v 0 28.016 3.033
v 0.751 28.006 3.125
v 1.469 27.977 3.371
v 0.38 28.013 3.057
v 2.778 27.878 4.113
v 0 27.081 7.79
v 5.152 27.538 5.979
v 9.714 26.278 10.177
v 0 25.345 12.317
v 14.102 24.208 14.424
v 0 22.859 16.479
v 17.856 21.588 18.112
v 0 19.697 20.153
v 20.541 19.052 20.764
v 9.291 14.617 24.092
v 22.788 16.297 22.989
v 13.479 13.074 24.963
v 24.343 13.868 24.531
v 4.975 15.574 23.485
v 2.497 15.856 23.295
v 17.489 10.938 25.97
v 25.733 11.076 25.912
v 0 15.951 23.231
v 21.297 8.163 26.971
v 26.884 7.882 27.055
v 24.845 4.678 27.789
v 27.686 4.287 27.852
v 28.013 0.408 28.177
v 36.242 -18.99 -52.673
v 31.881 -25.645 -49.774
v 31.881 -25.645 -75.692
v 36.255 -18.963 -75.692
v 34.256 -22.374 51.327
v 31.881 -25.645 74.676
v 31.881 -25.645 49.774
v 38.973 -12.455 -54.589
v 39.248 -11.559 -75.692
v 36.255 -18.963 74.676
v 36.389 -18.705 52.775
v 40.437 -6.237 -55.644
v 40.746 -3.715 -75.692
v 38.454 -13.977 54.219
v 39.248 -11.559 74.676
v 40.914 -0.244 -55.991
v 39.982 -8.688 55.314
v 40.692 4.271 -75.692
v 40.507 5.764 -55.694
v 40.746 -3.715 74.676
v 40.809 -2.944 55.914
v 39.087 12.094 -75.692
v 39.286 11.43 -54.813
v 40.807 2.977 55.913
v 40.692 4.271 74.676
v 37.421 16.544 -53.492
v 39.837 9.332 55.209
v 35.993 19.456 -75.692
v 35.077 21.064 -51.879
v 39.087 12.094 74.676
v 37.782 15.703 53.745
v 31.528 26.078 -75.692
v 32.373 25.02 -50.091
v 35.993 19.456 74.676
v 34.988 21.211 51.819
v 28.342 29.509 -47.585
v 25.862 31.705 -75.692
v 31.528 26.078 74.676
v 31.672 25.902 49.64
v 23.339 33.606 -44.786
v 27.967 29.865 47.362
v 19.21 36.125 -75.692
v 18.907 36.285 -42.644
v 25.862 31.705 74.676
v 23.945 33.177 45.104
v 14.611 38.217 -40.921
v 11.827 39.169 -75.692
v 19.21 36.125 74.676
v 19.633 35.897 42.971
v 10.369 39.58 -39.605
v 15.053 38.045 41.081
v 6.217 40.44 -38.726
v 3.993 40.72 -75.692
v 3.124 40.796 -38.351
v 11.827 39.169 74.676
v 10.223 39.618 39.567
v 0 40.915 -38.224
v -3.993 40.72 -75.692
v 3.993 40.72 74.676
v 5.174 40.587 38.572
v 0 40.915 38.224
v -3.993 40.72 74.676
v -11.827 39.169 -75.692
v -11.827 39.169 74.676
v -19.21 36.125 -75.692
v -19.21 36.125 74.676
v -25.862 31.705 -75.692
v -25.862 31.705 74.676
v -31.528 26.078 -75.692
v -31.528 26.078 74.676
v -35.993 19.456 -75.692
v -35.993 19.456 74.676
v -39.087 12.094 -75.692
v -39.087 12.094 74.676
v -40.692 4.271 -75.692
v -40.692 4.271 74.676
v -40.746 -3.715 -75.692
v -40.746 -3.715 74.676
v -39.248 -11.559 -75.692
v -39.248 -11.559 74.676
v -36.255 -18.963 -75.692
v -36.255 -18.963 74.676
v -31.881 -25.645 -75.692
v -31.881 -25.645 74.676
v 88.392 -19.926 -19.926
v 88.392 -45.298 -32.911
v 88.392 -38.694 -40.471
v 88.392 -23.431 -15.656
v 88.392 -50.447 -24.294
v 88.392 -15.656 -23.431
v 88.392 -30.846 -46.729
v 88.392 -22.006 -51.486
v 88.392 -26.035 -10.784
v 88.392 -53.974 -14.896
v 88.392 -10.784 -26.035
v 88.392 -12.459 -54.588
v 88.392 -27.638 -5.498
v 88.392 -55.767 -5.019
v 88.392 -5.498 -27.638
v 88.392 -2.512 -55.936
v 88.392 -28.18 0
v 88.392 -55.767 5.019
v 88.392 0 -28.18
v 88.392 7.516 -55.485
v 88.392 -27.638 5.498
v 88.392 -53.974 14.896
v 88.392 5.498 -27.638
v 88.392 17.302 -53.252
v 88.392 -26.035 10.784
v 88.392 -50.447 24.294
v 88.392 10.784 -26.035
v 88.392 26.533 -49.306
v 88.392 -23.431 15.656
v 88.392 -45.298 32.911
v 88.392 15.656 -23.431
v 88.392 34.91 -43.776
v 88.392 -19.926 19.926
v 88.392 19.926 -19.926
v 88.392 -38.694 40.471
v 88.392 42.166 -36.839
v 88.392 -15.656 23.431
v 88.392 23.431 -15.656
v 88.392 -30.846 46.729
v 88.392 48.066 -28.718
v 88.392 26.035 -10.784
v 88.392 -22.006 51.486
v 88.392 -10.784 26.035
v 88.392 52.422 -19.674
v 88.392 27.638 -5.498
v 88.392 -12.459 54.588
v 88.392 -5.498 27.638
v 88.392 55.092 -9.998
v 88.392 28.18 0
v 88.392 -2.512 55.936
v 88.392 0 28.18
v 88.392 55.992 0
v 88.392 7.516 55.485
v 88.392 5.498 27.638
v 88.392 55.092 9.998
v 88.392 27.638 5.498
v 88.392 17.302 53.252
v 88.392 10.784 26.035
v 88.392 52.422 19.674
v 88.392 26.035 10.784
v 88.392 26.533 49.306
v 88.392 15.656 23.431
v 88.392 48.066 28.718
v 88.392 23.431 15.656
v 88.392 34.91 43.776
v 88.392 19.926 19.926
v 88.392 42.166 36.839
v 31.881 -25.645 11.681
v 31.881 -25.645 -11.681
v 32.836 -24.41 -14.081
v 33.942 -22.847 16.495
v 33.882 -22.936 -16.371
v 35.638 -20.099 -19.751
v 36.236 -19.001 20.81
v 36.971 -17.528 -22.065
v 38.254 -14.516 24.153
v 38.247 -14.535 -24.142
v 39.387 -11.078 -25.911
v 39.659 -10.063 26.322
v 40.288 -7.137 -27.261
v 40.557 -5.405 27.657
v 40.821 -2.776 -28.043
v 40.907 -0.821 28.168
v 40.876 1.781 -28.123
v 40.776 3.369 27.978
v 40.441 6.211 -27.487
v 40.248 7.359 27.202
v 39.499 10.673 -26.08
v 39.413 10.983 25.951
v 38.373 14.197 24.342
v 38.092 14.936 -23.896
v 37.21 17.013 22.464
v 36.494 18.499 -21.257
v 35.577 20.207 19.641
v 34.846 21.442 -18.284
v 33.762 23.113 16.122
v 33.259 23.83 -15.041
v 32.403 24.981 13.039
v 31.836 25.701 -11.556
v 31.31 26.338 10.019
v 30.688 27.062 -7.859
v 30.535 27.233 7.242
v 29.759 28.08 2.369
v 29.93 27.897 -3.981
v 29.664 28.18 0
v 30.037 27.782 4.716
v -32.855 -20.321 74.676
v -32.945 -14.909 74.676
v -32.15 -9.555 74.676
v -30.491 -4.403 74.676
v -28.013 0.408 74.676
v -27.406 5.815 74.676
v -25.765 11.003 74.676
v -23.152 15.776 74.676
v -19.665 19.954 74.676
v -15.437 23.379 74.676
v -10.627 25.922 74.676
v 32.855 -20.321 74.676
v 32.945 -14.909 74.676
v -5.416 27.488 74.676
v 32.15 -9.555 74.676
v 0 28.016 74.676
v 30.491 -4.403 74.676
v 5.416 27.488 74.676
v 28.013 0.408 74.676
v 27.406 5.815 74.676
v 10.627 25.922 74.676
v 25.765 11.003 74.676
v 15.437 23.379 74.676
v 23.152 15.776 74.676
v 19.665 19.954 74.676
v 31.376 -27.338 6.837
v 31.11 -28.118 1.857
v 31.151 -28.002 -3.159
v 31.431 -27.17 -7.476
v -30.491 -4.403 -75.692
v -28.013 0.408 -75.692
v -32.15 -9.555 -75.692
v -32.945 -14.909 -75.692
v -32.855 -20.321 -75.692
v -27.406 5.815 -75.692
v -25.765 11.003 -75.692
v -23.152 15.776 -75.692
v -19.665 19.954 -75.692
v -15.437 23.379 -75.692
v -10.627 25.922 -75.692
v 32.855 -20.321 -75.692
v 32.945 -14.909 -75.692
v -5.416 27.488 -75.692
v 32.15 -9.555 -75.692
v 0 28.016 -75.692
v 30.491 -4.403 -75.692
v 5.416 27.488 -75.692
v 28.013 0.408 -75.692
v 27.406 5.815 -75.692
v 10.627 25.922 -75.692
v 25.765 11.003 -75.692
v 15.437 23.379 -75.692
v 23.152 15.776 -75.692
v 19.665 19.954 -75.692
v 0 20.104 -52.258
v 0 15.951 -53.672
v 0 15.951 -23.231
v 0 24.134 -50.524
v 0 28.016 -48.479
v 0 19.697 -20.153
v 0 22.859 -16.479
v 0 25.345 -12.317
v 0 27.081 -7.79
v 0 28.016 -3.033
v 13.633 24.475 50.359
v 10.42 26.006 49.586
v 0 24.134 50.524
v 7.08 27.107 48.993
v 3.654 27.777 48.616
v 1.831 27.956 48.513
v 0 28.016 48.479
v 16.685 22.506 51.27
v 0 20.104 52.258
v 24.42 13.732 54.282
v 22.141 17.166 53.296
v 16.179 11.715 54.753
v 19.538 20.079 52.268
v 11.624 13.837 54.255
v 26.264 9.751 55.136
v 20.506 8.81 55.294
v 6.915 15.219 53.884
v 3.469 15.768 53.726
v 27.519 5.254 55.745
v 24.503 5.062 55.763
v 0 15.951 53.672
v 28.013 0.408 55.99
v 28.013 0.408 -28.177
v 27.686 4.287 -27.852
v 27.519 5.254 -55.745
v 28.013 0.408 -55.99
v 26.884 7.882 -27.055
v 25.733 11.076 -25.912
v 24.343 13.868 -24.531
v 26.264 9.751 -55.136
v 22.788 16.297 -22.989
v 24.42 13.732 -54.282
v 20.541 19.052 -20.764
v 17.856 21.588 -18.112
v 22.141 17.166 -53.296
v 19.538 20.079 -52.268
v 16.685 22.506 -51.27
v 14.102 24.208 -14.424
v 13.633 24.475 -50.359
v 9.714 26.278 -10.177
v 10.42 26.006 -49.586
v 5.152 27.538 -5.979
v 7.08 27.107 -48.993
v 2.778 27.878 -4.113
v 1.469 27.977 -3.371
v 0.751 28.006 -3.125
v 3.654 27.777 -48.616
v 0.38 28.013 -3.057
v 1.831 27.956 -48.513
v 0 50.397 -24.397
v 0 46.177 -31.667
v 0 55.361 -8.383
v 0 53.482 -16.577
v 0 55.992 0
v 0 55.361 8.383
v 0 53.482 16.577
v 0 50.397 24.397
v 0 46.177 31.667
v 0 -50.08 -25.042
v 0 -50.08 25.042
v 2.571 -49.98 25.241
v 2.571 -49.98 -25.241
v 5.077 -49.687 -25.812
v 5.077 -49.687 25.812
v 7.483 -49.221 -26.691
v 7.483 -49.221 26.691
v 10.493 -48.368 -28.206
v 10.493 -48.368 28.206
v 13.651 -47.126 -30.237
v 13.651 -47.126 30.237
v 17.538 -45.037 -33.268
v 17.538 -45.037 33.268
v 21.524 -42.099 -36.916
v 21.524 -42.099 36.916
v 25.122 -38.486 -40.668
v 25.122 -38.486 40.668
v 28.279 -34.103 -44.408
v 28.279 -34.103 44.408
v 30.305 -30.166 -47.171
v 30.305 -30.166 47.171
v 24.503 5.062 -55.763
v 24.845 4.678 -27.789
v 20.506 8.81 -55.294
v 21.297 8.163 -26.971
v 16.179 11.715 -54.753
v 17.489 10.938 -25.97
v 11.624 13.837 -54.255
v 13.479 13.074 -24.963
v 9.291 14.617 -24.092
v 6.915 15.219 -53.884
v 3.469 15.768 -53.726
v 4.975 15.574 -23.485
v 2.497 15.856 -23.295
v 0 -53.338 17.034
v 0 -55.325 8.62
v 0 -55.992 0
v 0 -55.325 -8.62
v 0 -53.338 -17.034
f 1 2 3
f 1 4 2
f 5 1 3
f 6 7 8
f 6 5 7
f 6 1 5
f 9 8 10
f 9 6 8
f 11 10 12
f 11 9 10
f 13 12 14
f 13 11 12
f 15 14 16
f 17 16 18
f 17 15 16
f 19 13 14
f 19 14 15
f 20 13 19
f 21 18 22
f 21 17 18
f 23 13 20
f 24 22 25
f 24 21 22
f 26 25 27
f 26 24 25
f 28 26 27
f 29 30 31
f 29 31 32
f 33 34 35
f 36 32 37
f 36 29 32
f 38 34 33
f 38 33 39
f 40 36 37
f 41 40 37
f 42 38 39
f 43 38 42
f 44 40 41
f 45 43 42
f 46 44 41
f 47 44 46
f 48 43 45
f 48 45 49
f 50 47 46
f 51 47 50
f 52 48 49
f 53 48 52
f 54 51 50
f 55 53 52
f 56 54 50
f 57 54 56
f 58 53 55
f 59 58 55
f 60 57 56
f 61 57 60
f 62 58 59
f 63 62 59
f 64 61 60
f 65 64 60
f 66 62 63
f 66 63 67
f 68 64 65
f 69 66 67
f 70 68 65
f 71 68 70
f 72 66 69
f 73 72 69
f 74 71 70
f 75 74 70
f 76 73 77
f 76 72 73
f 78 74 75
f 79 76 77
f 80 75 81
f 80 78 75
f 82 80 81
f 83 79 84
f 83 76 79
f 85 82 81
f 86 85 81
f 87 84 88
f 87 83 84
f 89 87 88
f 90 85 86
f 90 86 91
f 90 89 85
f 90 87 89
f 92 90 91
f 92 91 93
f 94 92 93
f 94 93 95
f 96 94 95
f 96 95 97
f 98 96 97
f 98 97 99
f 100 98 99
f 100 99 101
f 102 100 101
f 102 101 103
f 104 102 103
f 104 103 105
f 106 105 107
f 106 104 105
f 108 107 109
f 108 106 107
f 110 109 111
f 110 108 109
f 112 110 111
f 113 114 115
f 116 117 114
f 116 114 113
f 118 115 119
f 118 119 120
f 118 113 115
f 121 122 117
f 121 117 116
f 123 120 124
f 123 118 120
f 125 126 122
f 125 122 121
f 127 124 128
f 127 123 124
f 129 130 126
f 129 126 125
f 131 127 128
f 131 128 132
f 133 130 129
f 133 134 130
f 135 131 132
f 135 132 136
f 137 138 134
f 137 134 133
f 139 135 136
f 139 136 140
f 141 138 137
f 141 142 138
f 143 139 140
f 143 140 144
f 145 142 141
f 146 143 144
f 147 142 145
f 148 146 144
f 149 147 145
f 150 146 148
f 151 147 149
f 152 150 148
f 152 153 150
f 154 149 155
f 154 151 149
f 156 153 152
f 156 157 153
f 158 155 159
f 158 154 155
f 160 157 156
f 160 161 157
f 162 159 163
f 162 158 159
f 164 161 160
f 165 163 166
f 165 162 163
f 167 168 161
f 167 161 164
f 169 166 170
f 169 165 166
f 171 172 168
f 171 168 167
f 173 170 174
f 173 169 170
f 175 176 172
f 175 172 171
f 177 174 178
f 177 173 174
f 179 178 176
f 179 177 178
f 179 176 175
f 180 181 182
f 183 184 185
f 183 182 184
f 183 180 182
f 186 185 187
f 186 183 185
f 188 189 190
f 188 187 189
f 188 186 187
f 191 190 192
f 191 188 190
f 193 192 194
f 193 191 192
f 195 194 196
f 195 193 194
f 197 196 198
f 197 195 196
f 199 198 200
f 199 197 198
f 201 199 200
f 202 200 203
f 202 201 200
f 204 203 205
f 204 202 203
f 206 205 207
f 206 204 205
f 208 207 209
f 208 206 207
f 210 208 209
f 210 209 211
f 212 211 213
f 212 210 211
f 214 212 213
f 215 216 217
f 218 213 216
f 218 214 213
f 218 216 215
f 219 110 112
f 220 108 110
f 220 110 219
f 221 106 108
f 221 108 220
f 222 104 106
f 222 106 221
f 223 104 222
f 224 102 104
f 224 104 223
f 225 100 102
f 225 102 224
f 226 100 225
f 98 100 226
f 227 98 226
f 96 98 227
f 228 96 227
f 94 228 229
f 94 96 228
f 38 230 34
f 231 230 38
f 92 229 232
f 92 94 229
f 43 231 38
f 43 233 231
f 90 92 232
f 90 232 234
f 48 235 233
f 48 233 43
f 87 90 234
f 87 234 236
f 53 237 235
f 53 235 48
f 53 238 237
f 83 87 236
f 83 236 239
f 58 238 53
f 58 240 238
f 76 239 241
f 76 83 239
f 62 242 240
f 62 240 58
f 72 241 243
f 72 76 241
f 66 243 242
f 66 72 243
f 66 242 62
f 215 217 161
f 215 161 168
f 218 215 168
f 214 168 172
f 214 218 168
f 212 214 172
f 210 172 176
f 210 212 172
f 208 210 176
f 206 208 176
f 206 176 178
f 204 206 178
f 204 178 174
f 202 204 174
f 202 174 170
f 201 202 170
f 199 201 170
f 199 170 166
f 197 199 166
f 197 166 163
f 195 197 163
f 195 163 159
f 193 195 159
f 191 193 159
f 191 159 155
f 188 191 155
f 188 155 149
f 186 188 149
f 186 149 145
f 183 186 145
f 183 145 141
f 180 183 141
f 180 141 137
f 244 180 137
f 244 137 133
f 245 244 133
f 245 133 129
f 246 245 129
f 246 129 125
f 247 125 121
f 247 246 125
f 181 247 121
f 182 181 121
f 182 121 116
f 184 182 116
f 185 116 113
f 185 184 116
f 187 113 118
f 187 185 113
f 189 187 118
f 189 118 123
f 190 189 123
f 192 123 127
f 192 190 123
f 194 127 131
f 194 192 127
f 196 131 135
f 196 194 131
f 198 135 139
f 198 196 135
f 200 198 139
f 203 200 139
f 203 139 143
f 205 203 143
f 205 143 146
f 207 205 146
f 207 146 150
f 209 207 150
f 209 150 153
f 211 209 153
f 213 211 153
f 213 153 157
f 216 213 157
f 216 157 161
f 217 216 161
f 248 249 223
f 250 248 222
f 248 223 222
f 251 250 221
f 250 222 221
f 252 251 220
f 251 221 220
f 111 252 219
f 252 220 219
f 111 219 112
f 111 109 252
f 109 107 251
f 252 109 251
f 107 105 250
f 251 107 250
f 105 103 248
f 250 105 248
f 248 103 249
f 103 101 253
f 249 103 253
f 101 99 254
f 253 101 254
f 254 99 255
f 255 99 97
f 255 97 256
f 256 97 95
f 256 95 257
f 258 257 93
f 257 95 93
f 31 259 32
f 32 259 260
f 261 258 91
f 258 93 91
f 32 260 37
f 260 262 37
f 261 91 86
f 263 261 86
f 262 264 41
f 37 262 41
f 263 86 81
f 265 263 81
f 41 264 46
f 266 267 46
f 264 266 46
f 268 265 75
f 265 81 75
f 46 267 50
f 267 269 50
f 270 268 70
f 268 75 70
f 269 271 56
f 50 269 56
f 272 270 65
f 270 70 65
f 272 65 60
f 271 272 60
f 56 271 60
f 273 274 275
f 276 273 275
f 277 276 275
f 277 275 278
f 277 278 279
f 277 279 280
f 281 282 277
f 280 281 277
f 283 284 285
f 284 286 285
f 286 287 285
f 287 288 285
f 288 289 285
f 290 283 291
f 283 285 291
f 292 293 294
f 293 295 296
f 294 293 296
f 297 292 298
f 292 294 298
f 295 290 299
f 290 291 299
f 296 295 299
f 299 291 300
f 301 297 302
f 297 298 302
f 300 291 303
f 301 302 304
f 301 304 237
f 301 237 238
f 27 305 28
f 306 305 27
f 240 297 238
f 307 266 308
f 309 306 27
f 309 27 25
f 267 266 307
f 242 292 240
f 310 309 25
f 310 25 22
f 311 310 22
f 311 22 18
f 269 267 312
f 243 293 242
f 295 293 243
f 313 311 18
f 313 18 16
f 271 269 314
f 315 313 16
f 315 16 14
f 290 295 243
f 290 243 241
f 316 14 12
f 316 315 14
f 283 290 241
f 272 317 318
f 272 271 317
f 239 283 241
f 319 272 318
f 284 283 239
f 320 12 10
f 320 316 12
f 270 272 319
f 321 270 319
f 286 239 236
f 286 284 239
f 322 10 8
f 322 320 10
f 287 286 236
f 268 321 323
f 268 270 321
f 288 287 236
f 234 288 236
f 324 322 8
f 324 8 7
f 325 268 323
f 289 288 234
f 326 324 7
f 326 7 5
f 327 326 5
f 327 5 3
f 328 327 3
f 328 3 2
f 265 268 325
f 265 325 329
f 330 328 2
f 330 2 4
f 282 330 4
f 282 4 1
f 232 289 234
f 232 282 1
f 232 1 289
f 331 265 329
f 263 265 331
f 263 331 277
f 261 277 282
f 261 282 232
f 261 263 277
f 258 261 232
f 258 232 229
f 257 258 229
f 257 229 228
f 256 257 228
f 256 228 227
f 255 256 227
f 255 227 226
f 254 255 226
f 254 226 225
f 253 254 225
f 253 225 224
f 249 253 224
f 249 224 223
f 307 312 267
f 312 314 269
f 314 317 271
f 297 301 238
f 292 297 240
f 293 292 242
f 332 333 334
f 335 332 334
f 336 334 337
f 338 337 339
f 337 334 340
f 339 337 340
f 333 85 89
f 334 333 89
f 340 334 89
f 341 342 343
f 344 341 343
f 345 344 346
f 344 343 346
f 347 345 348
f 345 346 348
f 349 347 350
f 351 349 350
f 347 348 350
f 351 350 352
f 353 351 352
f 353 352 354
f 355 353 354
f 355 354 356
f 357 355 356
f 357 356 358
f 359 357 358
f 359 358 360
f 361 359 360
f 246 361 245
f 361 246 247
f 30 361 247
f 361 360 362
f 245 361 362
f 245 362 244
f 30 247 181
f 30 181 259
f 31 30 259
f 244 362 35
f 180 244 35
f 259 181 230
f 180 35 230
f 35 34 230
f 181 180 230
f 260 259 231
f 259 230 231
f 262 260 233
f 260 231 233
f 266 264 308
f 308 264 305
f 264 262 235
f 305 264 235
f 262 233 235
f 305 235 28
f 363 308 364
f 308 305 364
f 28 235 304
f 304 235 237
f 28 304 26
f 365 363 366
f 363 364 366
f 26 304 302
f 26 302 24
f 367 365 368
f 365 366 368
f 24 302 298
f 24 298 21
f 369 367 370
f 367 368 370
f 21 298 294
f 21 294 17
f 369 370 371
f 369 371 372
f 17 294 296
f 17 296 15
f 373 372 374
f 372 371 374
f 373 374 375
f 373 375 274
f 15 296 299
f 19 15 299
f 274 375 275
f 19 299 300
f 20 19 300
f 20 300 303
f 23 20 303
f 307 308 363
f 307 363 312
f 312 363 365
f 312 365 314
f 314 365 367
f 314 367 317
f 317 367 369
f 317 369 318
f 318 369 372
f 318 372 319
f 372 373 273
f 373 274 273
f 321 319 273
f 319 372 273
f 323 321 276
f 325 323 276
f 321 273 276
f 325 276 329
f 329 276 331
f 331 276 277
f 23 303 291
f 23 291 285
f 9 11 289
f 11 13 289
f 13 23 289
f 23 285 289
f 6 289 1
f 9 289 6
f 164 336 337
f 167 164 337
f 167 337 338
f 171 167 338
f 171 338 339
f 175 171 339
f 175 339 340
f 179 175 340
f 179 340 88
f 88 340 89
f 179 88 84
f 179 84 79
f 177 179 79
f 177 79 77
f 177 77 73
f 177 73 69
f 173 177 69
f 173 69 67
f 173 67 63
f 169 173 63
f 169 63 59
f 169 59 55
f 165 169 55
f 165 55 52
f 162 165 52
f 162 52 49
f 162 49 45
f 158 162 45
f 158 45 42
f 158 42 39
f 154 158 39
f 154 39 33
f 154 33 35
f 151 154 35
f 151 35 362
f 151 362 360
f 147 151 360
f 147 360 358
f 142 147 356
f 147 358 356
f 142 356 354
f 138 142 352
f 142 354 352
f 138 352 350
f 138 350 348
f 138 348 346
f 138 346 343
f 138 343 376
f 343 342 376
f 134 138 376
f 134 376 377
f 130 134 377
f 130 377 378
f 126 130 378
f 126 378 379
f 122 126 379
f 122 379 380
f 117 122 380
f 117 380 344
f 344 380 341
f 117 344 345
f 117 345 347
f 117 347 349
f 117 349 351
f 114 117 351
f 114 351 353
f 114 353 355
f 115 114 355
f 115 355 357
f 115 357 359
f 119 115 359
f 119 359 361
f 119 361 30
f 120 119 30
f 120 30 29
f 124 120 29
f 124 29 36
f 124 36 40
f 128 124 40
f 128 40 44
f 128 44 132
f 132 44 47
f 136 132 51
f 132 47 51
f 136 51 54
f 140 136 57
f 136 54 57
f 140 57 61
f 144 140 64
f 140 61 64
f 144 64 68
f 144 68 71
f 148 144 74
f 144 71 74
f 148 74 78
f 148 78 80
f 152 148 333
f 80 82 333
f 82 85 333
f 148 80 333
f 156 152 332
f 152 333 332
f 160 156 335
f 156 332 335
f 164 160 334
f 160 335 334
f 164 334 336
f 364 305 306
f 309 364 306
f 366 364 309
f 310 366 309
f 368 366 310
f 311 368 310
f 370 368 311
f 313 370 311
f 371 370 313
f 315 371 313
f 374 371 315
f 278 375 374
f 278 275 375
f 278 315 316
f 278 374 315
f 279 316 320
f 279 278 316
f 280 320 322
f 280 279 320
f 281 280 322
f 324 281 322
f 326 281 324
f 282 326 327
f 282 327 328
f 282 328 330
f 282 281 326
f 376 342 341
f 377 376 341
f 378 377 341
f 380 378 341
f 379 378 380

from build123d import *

# Parameters (mm, degrees)
F0_R     = 40.915228
F0_R_2   = 28.015967
F1_DEPTH = 74.676
F2_DEPTH = 75.692
F3_R     = 55.991945
F3_R_2   = 28.179718
F4_DEPTH = 88.392
F6_R     = 33.015508
F7_DEPTH = 170.18


with BuildPart() as f1:
    # F0 (on Top) → F1 (new body)
    with BuildSketch(Plane.XY):
        Circle(F0_R)
        Circle(F0_R_2, mode=Mode.SUBTRACT)
    extrude(amount=F1_DEPTH)

    # F0 (on Top) → F2 (join)
    with BuildSketch(Plane.XY):
        Circle(F0_R)
        Circle(F0_R_2, mode=Mode.SUBTRACT)
    extrude(amount=-F2_DEPTH)

    # F3 (on Right) → F4 (join)
    with BuildSketch(Plane.YZ):
        Circle(F3_R)
        Circle(F3_R_2, mode=Mode.SUBTRACT)
    extrude(amount=F4_DEPTH)

    # F6 (on face) → F7 (cut)
    with BuildSketch(Plane.XY.offset(74.676)):
        with Locations((0, -17.064605)):
            Circle(F6_R)
    extrude(amount=-F7_DEPTH, mode=Mode.SUBTRACT)


solid = f1.part
